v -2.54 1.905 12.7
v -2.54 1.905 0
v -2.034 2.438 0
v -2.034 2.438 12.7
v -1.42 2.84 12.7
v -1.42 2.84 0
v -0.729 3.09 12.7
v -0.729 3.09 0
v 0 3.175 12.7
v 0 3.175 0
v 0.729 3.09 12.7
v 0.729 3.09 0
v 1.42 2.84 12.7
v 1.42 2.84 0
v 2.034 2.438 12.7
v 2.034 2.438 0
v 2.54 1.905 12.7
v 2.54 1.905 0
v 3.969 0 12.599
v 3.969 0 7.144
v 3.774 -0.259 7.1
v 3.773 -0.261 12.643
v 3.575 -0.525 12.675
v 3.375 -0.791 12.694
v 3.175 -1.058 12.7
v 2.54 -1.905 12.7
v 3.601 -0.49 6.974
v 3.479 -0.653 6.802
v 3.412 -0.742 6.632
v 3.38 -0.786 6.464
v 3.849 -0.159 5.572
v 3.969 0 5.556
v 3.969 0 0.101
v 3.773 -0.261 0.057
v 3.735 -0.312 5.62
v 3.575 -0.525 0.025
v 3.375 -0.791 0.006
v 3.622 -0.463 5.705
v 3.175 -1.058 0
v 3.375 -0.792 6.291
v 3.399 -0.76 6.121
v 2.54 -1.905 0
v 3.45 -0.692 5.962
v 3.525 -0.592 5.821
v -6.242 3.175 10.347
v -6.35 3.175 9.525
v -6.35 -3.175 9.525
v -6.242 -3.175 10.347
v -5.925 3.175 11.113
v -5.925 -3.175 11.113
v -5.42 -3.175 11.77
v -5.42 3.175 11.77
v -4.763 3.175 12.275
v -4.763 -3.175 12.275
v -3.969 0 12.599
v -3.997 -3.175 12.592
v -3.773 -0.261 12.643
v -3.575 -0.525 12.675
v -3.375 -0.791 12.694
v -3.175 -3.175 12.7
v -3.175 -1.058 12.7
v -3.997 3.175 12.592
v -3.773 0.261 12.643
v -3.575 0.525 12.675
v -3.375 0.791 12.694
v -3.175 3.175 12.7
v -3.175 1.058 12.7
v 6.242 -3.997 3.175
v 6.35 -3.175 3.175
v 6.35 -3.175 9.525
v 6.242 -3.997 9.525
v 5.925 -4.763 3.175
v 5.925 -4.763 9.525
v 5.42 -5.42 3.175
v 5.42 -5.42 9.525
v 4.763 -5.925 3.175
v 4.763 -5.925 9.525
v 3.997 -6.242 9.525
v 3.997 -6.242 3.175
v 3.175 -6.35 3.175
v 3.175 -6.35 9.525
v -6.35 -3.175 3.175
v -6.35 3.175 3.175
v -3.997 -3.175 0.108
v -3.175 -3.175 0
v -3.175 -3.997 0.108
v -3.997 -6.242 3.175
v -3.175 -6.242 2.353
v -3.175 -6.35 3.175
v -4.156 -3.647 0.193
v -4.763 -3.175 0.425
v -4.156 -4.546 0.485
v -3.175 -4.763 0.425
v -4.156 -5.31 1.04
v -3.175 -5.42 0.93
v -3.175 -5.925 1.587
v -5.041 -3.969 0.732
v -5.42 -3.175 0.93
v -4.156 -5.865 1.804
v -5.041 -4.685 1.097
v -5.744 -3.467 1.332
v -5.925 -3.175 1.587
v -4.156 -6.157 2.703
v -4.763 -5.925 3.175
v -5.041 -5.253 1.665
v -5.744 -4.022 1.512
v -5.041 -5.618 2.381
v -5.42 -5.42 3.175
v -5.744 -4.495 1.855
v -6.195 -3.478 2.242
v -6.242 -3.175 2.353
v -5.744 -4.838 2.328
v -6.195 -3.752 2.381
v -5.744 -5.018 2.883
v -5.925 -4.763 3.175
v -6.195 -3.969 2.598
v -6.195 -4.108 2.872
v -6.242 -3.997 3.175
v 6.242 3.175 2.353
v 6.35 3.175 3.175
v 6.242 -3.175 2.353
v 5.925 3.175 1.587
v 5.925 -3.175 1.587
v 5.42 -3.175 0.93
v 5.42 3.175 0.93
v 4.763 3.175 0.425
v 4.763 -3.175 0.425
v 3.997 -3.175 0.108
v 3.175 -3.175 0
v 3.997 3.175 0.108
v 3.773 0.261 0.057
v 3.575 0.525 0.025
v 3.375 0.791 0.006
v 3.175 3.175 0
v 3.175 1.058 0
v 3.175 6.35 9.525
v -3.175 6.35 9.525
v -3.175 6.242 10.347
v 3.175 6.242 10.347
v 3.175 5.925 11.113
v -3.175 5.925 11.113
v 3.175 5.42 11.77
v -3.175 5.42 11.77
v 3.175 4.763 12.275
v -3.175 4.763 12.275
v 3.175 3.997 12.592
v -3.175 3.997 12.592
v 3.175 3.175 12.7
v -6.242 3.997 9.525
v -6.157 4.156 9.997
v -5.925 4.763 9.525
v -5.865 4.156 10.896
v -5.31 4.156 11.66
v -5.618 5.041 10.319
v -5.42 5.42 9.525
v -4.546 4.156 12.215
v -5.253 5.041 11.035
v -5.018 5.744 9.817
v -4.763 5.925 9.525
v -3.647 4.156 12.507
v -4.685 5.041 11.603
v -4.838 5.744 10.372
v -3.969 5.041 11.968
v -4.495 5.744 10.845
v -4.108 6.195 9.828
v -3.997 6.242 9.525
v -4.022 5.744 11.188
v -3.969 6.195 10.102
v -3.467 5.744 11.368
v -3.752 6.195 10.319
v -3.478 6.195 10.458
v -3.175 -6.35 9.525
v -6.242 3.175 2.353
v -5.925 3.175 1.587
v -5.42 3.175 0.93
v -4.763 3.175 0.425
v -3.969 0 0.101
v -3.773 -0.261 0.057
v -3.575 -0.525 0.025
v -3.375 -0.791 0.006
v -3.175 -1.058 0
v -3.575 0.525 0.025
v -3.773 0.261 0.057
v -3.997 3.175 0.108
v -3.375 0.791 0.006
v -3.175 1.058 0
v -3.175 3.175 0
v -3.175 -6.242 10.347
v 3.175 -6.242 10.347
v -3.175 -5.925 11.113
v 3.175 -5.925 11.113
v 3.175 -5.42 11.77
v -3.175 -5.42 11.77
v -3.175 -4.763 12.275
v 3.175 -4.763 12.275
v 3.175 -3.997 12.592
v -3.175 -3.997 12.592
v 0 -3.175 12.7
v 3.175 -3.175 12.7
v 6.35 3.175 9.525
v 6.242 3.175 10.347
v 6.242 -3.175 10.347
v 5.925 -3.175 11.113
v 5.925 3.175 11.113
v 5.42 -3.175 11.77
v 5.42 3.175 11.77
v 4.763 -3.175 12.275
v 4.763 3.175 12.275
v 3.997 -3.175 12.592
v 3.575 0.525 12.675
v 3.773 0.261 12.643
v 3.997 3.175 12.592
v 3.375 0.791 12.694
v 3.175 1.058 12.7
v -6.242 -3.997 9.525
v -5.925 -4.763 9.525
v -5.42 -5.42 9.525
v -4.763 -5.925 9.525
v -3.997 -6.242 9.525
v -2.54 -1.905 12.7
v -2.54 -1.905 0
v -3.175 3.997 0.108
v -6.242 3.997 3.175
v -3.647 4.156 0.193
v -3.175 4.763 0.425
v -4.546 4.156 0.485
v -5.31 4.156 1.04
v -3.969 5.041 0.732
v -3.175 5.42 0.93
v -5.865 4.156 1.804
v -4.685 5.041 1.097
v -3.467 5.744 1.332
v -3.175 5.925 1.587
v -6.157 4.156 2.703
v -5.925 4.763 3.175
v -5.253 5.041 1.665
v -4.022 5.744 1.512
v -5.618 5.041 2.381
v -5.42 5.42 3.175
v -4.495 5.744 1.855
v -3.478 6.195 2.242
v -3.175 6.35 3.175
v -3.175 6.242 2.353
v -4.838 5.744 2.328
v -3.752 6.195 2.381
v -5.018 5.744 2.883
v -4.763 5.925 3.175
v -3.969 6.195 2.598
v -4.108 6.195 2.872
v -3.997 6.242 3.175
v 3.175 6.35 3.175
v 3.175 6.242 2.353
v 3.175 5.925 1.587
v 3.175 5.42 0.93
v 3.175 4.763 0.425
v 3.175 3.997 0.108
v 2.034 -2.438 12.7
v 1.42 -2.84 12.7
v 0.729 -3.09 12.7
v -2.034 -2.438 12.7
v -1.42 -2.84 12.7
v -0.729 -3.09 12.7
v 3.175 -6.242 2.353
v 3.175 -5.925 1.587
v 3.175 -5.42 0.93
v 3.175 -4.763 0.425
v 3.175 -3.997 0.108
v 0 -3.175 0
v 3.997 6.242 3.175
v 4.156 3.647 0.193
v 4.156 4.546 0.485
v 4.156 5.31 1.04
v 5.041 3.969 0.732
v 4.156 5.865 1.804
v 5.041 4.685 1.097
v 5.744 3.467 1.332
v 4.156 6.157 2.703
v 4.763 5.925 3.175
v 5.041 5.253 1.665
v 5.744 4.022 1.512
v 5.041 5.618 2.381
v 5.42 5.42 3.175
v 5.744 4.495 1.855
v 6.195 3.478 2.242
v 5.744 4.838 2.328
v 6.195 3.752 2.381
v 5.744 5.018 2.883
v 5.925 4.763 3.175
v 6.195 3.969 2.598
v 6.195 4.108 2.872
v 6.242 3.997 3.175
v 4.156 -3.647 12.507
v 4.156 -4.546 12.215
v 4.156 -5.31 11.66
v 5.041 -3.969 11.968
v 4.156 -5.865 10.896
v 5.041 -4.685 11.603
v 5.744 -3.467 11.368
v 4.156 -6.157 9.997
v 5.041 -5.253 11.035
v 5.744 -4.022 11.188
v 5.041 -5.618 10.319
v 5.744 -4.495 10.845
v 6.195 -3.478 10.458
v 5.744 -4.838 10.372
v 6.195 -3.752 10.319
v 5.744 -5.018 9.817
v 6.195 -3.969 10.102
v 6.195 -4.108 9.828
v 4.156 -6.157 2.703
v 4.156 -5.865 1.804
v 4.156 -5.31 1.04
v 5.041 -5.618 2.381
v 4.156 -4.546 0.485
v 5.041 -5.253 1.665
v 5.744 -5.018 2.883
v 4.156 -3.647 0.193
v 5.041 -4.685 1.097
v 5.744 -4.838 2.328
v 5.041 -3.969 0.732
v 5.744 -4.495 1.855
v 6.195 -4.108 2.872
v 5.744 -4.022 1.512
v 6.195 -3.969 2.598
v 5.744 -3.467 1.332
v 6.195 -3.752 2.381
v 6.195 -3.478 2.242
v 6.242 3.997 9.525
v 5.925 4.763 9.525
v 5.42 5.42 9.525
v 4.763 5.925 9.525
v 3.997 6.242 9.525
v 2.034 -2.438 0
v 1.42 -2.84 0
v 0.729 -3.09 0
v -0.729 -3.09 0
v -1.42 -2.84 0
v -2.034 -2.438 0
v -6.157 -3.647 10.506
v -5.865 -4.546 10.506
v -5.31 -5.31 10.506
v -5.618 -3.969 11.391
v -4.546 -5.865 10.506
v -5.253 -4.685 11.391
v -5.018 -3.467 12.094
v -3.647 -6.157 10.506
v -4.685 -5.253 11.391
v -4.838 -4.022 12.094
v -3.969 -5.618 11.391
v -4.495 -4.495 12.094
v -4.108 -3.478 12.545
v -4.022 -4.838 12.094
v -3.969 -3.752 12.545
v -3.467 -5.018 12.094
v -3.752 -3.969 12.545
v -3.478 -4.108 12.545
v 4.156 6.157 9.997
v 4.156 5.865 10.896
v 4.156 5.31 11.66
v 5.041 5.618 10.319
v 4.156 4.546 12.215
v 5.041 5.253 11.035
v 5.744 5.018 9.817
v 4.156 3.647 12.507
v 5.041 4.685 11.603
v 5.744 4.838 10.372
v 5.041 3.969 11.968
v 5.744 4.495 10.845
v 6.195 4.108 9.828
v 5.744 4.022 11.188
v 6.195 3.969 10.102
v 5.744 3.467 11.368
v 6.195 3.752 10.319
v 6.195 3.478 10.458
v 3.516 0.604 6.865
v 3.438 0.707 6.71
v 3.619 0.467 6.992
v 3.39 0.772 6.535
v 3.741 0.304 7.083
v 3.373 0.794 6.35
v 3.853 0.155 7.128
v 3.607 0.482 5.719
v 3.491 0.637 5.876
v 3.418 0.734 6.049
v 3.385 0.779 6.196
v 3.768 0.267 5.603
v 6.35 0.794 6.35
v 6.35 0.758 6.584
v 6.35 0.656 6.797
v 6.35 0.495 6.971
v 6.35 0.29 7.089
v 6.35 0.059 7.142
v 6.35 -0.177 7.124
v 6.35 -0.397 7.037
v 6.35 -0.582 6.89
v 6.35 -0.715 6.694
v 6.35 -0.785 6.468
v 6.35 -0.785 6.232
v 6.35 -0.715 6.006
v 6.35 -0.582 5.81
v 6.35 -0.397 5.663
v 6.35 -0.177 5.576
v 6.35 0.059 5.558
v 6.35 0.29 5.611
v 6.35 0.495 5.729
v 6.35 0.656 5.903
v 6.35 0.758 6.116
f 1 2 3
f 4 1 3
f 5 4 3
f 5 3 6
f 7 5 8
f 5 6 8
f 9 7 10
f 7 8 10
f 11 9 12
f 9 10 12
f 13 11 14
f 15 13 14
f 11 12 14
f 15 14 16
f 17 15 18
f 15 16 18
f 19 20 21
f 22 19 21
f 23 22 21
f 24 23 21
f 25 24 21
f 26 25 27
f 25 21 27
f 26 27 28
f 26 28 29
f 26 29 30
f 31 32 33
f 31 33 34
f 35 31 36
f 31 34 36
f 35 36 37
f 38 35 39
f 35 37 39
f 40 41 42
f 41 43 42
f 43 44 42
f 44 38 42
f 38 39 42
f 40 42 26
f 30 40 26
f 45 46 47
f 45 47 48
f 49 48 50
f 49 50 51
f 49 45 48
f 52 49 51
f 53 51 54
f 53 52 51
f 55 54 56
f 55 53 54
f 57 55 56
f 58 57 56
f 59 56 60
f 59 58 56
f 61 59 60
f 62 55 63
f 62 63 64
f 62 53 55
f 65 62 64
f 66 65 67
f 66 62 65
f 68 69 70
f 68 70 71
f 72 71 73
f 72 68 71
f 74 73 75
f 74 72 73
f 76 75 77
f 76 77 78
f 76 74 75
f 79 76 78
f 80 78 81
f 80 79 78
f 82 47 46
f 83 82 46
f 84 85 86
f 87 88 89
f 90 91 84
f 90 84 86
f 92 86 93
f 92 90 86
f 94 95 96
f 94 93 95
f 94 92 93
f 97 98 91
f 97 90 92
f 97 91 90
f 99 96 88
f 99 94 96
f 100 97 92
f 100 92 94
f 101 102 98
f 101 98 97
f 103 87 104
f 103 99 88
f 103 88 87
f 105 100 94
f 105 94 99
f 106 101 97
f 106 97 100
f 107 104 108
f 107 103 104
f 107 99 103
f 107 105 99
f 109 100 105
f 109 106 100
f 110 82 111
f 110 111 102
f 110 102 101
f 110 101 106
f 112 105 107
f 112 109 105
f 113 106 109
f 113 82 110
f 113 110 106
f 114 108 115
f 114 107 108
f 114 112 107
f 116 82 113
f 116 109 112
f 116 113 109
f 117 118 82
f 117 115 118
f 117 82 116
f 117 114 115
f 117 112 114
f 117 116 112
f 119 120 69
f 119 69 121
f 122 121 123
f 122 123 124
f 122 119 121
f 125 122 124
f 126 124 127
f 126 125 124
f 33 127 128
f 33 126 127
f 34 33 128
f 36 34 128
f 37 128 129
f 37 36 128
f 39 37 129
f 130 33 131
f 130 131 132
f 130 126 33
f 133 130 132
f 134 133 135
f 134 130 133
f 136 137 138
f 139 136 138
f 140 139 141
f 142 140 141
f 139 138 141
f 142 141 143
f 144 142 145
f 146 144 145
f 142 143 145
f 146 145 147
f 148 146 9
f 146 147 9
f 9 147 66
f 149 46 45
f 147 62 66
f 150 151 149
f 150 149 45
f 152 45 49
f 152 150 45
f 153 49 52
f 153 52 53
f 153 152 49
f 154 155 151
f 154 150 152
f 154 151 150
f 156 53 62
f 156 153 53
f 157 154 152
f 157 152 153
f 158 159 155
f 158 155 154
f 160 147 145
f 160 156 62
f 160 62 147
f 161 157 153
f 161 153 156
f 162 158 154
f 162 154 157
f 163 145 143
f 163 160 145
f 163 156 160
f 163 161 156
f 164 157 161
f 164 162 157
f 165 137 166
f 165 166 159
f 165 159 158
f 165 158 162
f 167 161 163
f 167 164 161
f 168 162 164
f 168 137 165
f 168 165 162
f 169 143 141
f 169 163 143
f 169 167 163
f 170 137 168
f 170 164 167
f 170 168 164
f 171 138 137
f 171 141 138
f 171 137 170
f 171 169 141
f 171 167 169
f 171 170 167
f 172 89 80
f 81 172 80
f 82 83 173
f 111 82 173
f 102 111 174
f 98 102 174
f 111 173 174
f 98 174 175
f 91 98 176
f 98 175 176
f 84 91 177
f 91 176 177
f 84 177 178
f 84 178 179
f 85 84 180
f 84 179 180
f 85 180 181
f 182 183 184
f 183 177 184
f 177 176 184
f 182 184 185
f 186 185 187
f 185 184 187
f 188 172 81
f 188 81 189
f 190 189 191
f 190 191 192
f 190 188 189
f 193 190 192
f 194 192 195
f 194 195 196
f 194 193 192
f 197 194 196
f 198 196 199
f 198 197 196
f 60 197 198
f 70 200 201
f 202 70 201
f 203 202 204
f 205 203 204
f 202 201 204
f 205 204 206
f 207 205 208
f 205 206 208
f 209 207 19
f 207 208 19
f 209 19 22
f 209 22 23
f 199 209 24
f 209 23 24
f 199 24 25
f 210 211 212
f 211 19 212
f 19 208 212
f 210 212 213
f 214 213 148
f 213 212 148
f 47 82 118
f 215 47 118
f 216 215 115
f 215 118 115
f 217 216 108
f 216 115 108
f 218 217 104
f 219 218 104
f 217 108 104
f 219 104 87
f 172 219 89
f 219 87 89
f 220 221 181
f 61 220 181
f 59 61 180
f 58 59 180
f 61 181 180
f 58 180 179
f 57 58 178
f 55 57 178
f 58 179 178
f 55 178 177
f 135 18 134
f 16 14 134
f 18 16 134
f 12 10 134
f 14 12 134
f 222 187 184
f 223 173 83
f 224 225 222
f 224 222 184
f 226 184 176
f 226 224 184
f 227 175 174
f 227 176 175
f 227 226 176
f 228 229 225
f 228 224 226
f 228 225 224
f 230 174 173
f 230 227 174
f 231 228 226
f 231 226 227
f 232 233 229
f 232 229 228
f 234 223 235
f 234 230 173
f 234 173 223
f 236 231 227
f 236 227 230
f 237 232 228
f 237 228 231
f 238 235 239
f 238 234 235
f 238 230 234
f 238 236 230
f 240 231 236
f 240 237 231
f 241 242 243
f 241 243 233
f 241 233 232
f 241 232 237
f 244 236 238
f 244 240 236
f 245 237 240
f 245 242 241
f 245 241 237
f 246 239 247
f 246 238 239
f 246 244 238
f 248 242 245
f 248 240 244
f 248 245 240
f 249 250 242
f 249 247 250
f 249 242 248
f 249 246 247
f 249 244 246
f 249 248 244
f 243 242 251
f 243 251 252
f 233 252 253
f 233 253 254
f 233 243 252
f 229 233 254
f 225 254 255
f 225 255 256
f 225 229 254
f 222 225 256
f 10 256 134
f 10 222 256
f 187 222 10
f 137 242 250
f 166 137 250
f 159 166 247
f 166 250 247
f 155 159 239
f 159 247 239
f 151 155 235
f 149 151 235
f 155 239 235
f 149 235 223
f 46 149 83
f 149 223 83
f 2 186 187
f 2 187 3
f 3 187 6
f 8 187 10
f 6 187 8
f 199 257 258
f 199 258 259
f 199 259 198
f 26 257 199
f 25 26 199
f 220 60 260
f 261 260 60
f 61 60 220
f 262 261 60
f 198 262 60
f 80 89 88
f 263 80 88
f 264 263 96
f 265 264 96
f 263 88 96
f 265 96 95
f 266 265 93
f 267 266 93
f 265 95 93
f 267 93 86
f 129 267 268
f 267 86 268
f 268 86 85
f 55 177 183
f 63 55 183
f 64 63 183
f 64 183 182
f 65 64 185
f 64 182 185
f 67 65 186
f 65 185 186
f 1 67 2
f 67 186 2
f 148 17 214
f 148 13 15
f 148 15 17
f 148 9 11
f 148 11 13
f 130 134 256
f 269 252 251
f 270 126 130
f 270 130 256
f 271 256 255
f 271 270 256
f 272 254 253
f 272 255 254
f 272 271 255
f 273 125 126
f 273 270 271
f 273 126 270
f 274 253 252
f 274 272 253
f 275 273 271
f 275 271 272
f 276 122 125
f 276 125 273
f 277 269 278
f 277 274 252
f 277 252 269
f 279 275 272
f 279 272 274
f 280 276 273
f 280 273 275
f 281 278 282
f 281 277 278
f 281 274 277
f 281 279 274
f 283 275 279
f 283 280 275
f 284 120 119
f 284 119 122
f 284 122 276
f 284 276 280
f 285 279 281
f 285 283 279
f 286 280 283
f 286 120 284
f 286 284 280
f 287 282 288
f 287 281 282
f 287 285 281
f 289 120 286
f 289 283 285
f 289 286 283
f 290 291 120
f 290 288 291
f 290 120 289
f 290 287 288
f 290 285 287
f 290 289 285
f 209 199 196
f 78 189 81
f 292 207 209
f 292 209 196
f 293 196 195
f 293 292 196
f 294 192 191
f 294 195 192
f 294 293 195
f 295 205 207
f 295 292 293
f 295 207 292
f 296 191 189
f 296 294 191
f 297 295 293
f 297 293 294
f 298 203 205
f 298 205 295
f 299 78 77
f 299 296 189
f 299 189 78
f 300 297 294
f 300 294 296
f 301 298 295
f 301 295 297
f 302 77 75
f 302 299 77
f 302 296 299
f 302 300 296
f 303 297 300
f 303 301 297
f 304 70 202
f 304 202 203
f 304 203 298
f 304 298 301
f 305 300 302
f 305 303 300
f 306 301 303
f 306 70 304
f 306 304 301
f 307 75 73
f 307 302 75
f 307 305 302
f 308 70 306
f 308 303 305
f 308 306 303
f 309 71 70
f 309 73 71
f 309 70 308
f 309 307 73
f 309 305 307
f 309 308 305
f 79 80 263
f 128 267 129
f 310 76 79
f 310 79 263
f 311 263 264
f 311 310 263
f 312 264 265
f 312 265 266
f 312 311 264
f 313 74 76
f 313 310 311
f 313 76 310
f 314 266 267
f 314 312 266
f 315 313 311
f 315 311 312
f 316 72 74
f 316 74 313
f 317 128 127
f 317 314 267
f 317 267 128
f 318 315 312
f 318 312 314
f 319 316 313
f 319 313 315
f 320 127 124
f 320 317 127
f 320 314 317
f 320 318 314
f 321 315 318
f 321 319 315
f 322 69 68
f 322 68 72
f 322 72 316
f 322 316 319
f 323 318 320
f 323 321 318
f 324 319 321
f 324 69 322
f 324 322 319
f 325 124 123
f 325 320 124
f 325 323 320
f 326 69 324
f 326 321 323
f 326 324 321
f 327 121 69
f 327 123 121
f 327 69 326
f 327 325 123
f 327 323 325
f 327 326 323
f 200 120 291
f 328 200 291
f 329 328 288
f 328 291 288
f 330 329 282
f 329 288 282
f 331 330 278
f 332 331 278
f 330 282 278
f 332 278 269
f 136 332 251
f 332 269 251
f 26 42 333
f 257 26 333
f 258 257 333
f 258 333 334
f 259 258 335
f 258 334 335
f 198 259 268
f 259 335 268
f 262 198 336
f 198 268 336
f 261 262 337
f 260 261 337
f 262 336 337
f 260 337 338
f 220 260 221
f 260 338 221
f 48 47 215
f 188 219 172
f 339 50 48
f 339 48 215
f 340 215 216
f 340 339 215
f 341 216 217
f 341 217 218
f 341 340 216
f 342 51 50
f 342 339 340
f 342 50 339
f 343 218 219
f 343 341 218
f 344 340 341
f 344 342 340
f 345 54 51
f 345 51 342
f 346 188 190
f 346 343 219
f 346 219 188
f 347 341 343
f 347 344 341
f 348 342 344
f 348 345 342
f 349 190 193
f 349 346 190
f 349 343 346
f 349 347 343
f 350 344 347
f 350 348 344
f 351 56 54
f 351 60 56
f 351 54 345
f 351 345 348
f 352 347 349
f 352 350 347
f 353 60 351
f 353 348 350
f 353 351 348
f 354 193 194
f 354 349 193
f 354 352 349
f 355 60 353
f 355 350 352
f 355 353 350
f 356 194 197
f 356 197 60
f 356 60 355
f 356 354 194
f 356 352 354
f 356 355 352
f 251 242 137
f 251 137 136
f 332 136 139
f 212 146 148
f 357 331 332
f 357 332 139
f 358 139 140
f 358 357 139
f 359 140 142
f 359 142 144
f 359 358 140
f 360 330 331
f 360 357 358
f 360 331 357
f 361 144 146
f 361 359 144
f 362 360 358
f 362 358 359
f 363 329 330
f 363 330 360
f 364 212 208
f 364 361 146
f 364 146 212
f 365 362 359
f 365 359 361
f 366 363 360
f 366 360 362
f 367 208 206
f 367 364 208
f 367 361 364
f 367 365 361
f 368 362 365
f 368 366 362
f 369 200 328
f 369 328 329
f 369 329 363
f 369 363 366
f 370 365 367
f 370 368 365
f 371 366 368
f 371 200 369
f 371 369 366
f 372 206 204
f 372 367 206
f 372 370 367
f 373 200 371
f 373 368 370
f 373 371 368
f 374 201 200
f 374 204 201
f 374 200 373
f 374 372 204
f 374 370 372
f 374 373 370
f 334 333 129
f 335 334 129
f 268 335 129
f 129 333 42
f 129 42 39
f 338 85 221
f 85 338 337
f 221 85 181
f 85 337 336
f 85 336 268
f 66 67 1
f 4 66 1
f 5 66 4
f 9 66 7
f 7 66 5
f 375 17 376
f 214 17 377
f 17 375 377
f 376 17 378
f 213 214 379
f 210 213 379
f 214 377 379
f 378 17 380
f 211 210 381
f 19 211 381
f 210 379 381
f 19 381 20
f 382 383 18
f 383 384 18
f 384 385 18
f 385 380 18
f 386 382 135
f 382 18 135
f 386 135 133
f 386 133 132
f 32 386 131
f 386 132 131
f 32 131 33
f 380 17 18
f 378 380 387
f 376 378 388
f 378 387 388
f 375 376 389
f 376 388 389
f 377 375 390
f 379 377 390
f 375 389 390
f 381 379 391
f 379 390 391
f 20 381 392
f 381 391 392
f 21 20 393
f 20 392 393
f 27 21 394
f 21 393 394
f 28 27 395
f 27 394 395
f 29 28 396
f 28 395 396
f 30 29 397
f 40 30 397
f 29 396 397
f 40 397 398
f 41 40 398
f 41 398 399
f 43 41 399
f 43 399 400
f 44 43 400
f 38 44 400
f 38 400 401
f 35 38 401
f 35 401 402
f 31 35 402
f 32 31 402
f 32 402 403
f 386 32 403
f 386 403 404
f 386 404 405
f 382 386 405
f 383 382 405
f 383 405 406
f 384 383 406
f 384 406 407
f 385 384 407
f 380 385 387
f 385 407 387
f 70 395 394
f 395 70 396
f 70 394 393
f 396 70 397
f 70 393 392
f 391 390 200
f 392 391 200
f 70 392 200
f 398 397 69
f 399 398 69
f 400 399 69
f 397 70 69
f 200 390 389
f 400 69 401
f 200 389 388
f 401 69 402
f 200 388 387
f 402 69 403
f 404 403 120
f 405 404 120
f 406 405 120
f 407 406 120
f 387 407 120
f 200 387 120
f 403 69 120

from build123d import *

# Parameters (mm, degrees)
F0_W         = 12.7
F0_H         = 12.7
F1_DEPTH     = 12.7
F2_T1_DEPTH  = 6.35
F2_T3_DEPTH  = 6.35
F2_T5_DEPTH  = 6.35
F2_S9_W      = 3.175
F2_S9_H      = 3.175
F2_T10_DEPTH = 3.175
F2_S15_W     = 3.175
F2_S15_H     = 3.175
F2_T16_DEPTH = 3.175
F2_S21_W     = 3.175
F2_S21_H     = 3.175
F2_T22_DEPTH = 3.175
F2_S27_W     = 3.175
F2_S27_H     = 3.175
F2_T28_DEPTH = 3.175
F2_S33_W     = 3.175
F2_S33_H     = 3.175
F2_T34_DEPTH = 3.175
F2_S39_W     = 3.175
F2_S39_H     = 3.175
F2_T40_DEPTH = 3.175
F2_S45_W     = 3.175
F2_S45_H     = 3.175
F2_T46_DEPTH = 3.175
F2_S51_W     = 3.175
F2_S51_H     = 3.175
F2_T52_DEPTH = 3.175
F3_R         = 0.79375
F4_DEPTH     = 6.2992


# Not quite as in the source:
# - a fillet or chamfer that OpenCascade refuses, or shapes differently, is made with other operations: its cross-section is extruded or revolved along the edge and cut away or added


with BuildPart() as f1:
    # F0 (on Top) → F1 (new body)
    with BuildSketch(Plane.XY):
        Rectangle(F0_W, F0_H)
        with BuildLine():
            ThreePointArc((-2.54, 1.905), (0, 3.175), (2.54, 1.905))
            Line((2.54, 1.905), (3.96875, 0))
            Line((3.96875, 0), (2.54, -1.905))
            ThreePointArc((2.54, -1.905), (0, -3.175), (-2.54, -1.905))
            Line((-2.54, -1.905), (-3.96875, 0))
            Line((-3.96875, 0), (-2.54, 1.905))
        make_face(mode=Mode.SUBTRACT)
    extrude(amount=F1_DEPTH)

    # F2: fillet of radius 3.175 on 12 edges, made by hand

    # F2_s2 → F2_t1 (cut)
    with BuildSketch(Plane.XY.offset(3.175)):
        with BuildLine():
            ThreePointArc((6.35, -3.175), (5.4200640303, -5.4200640303), (3.175, -6.35))
            Line((3.175, -6.35), (6.35, -6.35))
            Line((6.35, -6.35), (6.35, -3.175))
        make_face()
        with BuildLine():
            ThreePointArc((6.35, 3.175), (5.4200640303, 5.4200640303), (3.175, 6.35))
            Line((3.175, 6.35), (6.35, 6.35))
            Line((6.35, 6.35), (6.35, 3.175))
        make_face()
        with BuildLine():
            ThreePointArc((-3.175, 6.35), (-5.4200640303, 5.4200640303), (-6.35, 3.175))
            Line((-6.35, 3.175), (-6.35, 6.35))
            Line((-6.35, 6.35), (-3.175, 6.35))
        make_face()
        with BuildLine():
            ThreePointArc((-6.35, -3.175), (-5.4200640303, -5.4200640303), (-3.175, -6.35))
            Line((-3.175, -6.35), (-6.35, -6.35))
            Line((-6.35, -6.35), (-6.35, -3.175))
        make_face()
    extrude(amount=F2_T1_DEPTH, mode=Mode.SUBTRACT)

    # F2_s4 → F2_t3 (cut)
    with BuildSketch(Plane.YZ.offset(-3.175)):
        with BuildLine():
            ThreePointArc((-6.35, 9.525), (-5.4200640303, 11.7700640303), (-3.175, 12.7))
            Line((-3.175, 12.7), (-6.35, 12.7))
            Line((-6.35, 12.7), (-6.35, 9.525))
        make_face()
        with BuildLine():
            ThreePointArc((-6.35, 3.175), (-5.4200640303, 0.9299359697), (-3.175, 0))
            Line((-3.175, 0), (-6.35, 0))
            Line((-6.35, 0), (-6.35, 3.175))
        make_face()
        with BuildLine():
            ThreePointArc((6.35, 3.175), (5.4200640303, 0.9299359697), (3.175, 0))
            Line((3.175, 0), (6.35, 0))
            Line((6.35, 0), (6.35, 3.175))
        make_face()
        with BuildLine():
            ThreePointArc((6.35, 9.525), (5.4200640303, 11.7700640303), (3.175, 12.7))
            Line((3.175, 12.7), (6.35, 12.7))
            Line((6.35, 12.7), (6.35, 9.525))
        make_face()
    extrude(amount=F2_T3_DEPTH, mode=Mode.SUBTRACT)

    # F2_s6 → F2_t5 (cut)
    with BuildSketch(Plane.XZ.offset(-3.175)):
        with BuildLine():
            ThreePointArc((6.35, 9.525), (5.4200640303, 11.7700640303), (3.175, 12.7))
            Line((3.175, 12.7), (6.35, 12.7))
            Line((6.35, 12.7), (6.35, 9.525))
        make_face()
        with BuildLine():
            ThreePointArc((6.35, 3.175), (5.4200640303, 0.9299359697), (3.175, 0))
            Line((3.175, 0), (6.35, 0))
            Line((6.35, 0), (6.35, 3.175))
        make_face()
        with BuildLine():
            ThreePointArc((-6.35, 3.175), (-5.4200640303, 0.9299359697), (-3.175, 0))
            Line((-3.175, 0), (-6.35, 0))
            Line((-6.35, 0), (-6.35, 3.175))
        make_face()
        with BuildLine():
            ThreePointArc((-6.35, 9.525), (-5.4200640303, 11.7700640303), (-3.175, 12.7))
            Line((-3.175, 12.7), (-6.35, 12.7))
            Line((-6.35, 12.7), (-6.35, 9.525))
        make_face()
    extrude(amount=F2_T5_DEPTH, mode=Mode.SUBTRACT)


with BuildPart() as f2_tool8:
    # F2_s9 → F2_t10 (new body)
    with BuildSketch(Plane.YZ.offset(3.175)):
        with Locations((-4.7625, 1.5875)):
            Rectangle(F2_S9_W, F2_S9_H)
    extrude(amount=F2_T10_DEPTH)

    # F2_s11 → F2_t12 (revolve, cut)
    with BuildSketch(Plane(origin=(3.175, -3.175, 3.175), x_dir=(0, 0.7071067812, 0.7071067812), z_dir=(0, 0.7071067812, -0.7071067812))):
        with BuildLine():
            ThreePointArc((0, -3.175), (3.175, 0), (0, 3.175))
            Line((0, 3.175), (0, -3.175))
        make_face()
    revolve(axis=Axis((3.175, -3.175, 3.175), (1, 0, 0)), mode=Mode.SUBTRACT)


with BuildPart() as f1_1:
    add(f1.part)

    # F2_t7: cut F2_tool8
    add(f2_tool8.part, mode=Mode.SUBTRACT)


with BuildPart() as f2_tool14:
    # F2_s15 → F2_t16 (new body)
    with BuildSketch(Plane.YZ.offset(3.175)):
        with Locations((-4.7625, 11.1125)):
            Rectangle(F2_S15_W, F2_S15_H)
    extrude(amount=F2_T16_DEPTH)

    # F2_s17 → F2_t18 (revolve, cut)
    with BuildSketch(Plane(origin=(3.175, -3.175, 9.525), x_dir=(0, 0.7071067812, -0.7071067812), z_dir=(0, -0.7071067812, -0.7071067812))):
        with BuildLine():
            ThreePointArc((0, -3.175), (3.175, 0), (0, 3.175))
            Line((0, 3.175), (0, -3.175))
        make_face()
    revolve(axis=Axis((3.175, -3.175, 9.525), (1, 0, 0)), mode=Mode.SUBTRACT)


with BuildPart() as f1_2:
    add(f1_1.part)

    # F2_t13: cut F2_tool14
    add(f2_tool14.part, mode=Mode.SUBTRACT)


with BuildPart() as f2_tool20:
    # F2_s21 → F2_t22 (new body)
    with BuildSketch(Plane.XY.offset(9.525)):
        with Locations((-4.7625, -4.7625)):
            Rectangle(F2_S21_W, F2_S21_H)
    extrude(amount=F2_T22_DEPTH)

    # F2_s23 → F2_t24 (revolve, cut)
    with BuildSketch(Plane(origin=(-3.175, -3.175, 9.525), x_dir=(0.7071067812, 0.7071067812, 0), z_dir=(0.7071067812, -0.7071067812, 0))):
        with BuildLine():
            ThreePointArc((0, -3.175), (3.175, 0), (0, 3.175))
            Line((0, 3.175), (0, -3.175))
        make_face()
    revolve(axis=Axis((-3.175, -3.175, 9.525), (0, 0, 1)), mode=Mode.SUBTRACT)


with BuildPart() as f1_3:
    add(f1_2.part)

    # F2_t19: cut F2_tool20
    add(f2_tool20.part, mode=Mode.SUBTRACT)


with BuildPart() as f2_tool26:
    # F2_s27 → F2_t28 (new body)
    with BuildSketch(Plane.YZ.offset(3.175)):
        with Locations((4.7625, 11.1125)):
            Rectangle(F2_S27_W, F2_S27_H)
    extrude(amount=F2_T28_DEPTH)

    # F2_s29 → F2_t30 (revolve, cut)
    with BuildSketch(Plane(origin=(3.175, 3.175, 9.525), x_dir=(0, -0.7071067812, -0.7071067812), z_dir=(0, -0.7071067812, 0.7071067812))):
        with BuildLine():
            ThreePointArc((0, -3.175), (3.175, 0), (0, 3.175))
            Line((0, 3.175), (0, -3.175))
        make_face()
    revolve(axis=Axis((3.175, 3.175, 9.525), (1, 0, 0)), mode=Mode.SUBTRACT)


with BuildPart() as f1_4:
    add(f1_3.part)

    # F2_t25: cut F2_tool26
    add(f2_tool26.part, mode=Mode.SUBTRACT)


with BuildPart() as f2_tool32:
    # F2_s33 → F2_t34 (new body)
    with BuildSketch(Plane.YZ.offset(3.175)):
        with Locations((4.7625, 1.5875)):
            Rectangle(F2_S33_W, F2_S33_H)
    extrude(amount=F2_T34_DEPTH)

    # F2_s35 → F2_t36 (revolve, cut)
    with BuildSketch(Plane(origin=(3.175, 3.175, 3.175), x_dir=(0, -0.7071067812, 0.7071067812), z_dir=(0, 0.7071067812, 0.7071067812))):
        with BuildLine():
            ThreePointArc((0, -3.175), (3.175, 0), (0, 3.175))
            Line((0, 3.175), (0, -3.175))
        make_face()
    revolve(axis=Axis((3.175, 3.175, 3.175), (1, 0, 0)), mode=Mode.SUBTRACT)


with BuildPart() as f1_5:
    add(f1_4.part)

    # F2_t31: cut F2_tool32
    add(f2_tool32.part, mode=Mode.SUBTRACT)


with BuildPart() as f2_tool38:
    # F2_s39 → F2_t40 (new body)
    with BuildSketch(Plane.YZ.offset(-3.175)):
        with Locations((-4.7625, 1.5875)):
            Rectangle(F2_S39_W, F2_S39_H)
    extrude(amount=-F2_T40_DEPTH)

    # F2_s41 → F2_t42 (revolve, cut)
    with BuildSketch(Plane(origin=(-3.175, -3.175, 3.175), x_dir=(0, 0.7071067812, 0.7071067812), z_dir=(0, -0.7071067812, 0.7071067812))):
        with BuildLine():
            ThreePointArc((0, -3.175), (3.175, 0), (0, 3.175))
            Line((0, 3.175), (0, -3.175))
        make_face()
    revolve(axis=Axis((-3.175, -3.175, 3.175), (-1, 0, 0)), mode=Mode.SUBTRACT)


with BuildPart() as f1_6:
    add(f1_5.part)

    # F2_t37: cut F2_tool38
    add(f2_tool38.part, mode=Mode.SUBTRACT)


with BuildPart() as f2_tool44:
    # F2_s45 → F2_t46 (new body)
    with BuildSketch(Plane.XZ.offset(-3.175)):
        with Locations((-4.7625, 1.5875)):
            Rectangle(F2_S45_W, F2_S45_H)
    extrude(amount=-F2_T46_DEPTH)

    # F2_s47 → F2_t48 (revolve, cut)
    with BuildSketch(Plane(origin=(-3.175, 3.175, 3.175), x_dir=(0.7071067812, 0, 0.7071067812), z_dir=(-0.7071067812, 0, 0.7071067812))):
        with BuildLine():
            ThreePointArc((0, -3.175), (3.175, 0), (0, 3.175))
            Line((0, 3.175), (0, -3.175))
        make_face()
    revolve(axis=Axis((-3.175, 3.175, 3.175), (0, 1, 0)), mode=Mode.SUBTRACT)


with BuildPart() as f1_7:
    add(f1_6.part)

    # F2_t43: cut F2_tool44
    add(f2_tool44.part, mode=Mode.SUBTRACT)


with BuildPart() as f2_tool50:
    # F2_s51 → F2_t52 (new body)
    with BuildSketch(Plane.XZ.offset(-3.175)):
        with Locations((-4.7625, 11.1125)):
            Rectangle(F2_S51_W, F2_S51_H)
    extrude(amount=-F2_T52_DEPTH)

    # F2_s53 → F2_t54 (revolve, cut)
    with BuildSketch(Plane(origin=(-3.175, 3.175, 9.525), x_dir=(0.7071067812, 0, -0.7071067812), z_dir=(0.7071067812, 0, 0.7071067812))):
        with BuildLine():
            ThreePointArc((0, -3.175), (3.175, 0), (0, 3.175))
            Line((0, 3.175), (0, -3.175))
        make_face()
    revolve(axis=Axis((-3.175, 3.175, 9.525), (0, 1, 0)), mode=Mode.SUBTRACT)


with BuildPart() as f1_8:
    add(f1_7.part)

    # F2_t49: cut F2_tool50
    add(f2_tool50.part, mode=Mode.SUBTRACT)

    # F3 (on face) → F4 (cut)
    with BuildSketch(Plane.YZ.offset(6.35)):
        with Locations((0, 6.35)):
            Circle(F3_R)
    extrude(amount=-F4_DEPTH, mode=Mode.SUBTRACT)


solid = f1_8.part
